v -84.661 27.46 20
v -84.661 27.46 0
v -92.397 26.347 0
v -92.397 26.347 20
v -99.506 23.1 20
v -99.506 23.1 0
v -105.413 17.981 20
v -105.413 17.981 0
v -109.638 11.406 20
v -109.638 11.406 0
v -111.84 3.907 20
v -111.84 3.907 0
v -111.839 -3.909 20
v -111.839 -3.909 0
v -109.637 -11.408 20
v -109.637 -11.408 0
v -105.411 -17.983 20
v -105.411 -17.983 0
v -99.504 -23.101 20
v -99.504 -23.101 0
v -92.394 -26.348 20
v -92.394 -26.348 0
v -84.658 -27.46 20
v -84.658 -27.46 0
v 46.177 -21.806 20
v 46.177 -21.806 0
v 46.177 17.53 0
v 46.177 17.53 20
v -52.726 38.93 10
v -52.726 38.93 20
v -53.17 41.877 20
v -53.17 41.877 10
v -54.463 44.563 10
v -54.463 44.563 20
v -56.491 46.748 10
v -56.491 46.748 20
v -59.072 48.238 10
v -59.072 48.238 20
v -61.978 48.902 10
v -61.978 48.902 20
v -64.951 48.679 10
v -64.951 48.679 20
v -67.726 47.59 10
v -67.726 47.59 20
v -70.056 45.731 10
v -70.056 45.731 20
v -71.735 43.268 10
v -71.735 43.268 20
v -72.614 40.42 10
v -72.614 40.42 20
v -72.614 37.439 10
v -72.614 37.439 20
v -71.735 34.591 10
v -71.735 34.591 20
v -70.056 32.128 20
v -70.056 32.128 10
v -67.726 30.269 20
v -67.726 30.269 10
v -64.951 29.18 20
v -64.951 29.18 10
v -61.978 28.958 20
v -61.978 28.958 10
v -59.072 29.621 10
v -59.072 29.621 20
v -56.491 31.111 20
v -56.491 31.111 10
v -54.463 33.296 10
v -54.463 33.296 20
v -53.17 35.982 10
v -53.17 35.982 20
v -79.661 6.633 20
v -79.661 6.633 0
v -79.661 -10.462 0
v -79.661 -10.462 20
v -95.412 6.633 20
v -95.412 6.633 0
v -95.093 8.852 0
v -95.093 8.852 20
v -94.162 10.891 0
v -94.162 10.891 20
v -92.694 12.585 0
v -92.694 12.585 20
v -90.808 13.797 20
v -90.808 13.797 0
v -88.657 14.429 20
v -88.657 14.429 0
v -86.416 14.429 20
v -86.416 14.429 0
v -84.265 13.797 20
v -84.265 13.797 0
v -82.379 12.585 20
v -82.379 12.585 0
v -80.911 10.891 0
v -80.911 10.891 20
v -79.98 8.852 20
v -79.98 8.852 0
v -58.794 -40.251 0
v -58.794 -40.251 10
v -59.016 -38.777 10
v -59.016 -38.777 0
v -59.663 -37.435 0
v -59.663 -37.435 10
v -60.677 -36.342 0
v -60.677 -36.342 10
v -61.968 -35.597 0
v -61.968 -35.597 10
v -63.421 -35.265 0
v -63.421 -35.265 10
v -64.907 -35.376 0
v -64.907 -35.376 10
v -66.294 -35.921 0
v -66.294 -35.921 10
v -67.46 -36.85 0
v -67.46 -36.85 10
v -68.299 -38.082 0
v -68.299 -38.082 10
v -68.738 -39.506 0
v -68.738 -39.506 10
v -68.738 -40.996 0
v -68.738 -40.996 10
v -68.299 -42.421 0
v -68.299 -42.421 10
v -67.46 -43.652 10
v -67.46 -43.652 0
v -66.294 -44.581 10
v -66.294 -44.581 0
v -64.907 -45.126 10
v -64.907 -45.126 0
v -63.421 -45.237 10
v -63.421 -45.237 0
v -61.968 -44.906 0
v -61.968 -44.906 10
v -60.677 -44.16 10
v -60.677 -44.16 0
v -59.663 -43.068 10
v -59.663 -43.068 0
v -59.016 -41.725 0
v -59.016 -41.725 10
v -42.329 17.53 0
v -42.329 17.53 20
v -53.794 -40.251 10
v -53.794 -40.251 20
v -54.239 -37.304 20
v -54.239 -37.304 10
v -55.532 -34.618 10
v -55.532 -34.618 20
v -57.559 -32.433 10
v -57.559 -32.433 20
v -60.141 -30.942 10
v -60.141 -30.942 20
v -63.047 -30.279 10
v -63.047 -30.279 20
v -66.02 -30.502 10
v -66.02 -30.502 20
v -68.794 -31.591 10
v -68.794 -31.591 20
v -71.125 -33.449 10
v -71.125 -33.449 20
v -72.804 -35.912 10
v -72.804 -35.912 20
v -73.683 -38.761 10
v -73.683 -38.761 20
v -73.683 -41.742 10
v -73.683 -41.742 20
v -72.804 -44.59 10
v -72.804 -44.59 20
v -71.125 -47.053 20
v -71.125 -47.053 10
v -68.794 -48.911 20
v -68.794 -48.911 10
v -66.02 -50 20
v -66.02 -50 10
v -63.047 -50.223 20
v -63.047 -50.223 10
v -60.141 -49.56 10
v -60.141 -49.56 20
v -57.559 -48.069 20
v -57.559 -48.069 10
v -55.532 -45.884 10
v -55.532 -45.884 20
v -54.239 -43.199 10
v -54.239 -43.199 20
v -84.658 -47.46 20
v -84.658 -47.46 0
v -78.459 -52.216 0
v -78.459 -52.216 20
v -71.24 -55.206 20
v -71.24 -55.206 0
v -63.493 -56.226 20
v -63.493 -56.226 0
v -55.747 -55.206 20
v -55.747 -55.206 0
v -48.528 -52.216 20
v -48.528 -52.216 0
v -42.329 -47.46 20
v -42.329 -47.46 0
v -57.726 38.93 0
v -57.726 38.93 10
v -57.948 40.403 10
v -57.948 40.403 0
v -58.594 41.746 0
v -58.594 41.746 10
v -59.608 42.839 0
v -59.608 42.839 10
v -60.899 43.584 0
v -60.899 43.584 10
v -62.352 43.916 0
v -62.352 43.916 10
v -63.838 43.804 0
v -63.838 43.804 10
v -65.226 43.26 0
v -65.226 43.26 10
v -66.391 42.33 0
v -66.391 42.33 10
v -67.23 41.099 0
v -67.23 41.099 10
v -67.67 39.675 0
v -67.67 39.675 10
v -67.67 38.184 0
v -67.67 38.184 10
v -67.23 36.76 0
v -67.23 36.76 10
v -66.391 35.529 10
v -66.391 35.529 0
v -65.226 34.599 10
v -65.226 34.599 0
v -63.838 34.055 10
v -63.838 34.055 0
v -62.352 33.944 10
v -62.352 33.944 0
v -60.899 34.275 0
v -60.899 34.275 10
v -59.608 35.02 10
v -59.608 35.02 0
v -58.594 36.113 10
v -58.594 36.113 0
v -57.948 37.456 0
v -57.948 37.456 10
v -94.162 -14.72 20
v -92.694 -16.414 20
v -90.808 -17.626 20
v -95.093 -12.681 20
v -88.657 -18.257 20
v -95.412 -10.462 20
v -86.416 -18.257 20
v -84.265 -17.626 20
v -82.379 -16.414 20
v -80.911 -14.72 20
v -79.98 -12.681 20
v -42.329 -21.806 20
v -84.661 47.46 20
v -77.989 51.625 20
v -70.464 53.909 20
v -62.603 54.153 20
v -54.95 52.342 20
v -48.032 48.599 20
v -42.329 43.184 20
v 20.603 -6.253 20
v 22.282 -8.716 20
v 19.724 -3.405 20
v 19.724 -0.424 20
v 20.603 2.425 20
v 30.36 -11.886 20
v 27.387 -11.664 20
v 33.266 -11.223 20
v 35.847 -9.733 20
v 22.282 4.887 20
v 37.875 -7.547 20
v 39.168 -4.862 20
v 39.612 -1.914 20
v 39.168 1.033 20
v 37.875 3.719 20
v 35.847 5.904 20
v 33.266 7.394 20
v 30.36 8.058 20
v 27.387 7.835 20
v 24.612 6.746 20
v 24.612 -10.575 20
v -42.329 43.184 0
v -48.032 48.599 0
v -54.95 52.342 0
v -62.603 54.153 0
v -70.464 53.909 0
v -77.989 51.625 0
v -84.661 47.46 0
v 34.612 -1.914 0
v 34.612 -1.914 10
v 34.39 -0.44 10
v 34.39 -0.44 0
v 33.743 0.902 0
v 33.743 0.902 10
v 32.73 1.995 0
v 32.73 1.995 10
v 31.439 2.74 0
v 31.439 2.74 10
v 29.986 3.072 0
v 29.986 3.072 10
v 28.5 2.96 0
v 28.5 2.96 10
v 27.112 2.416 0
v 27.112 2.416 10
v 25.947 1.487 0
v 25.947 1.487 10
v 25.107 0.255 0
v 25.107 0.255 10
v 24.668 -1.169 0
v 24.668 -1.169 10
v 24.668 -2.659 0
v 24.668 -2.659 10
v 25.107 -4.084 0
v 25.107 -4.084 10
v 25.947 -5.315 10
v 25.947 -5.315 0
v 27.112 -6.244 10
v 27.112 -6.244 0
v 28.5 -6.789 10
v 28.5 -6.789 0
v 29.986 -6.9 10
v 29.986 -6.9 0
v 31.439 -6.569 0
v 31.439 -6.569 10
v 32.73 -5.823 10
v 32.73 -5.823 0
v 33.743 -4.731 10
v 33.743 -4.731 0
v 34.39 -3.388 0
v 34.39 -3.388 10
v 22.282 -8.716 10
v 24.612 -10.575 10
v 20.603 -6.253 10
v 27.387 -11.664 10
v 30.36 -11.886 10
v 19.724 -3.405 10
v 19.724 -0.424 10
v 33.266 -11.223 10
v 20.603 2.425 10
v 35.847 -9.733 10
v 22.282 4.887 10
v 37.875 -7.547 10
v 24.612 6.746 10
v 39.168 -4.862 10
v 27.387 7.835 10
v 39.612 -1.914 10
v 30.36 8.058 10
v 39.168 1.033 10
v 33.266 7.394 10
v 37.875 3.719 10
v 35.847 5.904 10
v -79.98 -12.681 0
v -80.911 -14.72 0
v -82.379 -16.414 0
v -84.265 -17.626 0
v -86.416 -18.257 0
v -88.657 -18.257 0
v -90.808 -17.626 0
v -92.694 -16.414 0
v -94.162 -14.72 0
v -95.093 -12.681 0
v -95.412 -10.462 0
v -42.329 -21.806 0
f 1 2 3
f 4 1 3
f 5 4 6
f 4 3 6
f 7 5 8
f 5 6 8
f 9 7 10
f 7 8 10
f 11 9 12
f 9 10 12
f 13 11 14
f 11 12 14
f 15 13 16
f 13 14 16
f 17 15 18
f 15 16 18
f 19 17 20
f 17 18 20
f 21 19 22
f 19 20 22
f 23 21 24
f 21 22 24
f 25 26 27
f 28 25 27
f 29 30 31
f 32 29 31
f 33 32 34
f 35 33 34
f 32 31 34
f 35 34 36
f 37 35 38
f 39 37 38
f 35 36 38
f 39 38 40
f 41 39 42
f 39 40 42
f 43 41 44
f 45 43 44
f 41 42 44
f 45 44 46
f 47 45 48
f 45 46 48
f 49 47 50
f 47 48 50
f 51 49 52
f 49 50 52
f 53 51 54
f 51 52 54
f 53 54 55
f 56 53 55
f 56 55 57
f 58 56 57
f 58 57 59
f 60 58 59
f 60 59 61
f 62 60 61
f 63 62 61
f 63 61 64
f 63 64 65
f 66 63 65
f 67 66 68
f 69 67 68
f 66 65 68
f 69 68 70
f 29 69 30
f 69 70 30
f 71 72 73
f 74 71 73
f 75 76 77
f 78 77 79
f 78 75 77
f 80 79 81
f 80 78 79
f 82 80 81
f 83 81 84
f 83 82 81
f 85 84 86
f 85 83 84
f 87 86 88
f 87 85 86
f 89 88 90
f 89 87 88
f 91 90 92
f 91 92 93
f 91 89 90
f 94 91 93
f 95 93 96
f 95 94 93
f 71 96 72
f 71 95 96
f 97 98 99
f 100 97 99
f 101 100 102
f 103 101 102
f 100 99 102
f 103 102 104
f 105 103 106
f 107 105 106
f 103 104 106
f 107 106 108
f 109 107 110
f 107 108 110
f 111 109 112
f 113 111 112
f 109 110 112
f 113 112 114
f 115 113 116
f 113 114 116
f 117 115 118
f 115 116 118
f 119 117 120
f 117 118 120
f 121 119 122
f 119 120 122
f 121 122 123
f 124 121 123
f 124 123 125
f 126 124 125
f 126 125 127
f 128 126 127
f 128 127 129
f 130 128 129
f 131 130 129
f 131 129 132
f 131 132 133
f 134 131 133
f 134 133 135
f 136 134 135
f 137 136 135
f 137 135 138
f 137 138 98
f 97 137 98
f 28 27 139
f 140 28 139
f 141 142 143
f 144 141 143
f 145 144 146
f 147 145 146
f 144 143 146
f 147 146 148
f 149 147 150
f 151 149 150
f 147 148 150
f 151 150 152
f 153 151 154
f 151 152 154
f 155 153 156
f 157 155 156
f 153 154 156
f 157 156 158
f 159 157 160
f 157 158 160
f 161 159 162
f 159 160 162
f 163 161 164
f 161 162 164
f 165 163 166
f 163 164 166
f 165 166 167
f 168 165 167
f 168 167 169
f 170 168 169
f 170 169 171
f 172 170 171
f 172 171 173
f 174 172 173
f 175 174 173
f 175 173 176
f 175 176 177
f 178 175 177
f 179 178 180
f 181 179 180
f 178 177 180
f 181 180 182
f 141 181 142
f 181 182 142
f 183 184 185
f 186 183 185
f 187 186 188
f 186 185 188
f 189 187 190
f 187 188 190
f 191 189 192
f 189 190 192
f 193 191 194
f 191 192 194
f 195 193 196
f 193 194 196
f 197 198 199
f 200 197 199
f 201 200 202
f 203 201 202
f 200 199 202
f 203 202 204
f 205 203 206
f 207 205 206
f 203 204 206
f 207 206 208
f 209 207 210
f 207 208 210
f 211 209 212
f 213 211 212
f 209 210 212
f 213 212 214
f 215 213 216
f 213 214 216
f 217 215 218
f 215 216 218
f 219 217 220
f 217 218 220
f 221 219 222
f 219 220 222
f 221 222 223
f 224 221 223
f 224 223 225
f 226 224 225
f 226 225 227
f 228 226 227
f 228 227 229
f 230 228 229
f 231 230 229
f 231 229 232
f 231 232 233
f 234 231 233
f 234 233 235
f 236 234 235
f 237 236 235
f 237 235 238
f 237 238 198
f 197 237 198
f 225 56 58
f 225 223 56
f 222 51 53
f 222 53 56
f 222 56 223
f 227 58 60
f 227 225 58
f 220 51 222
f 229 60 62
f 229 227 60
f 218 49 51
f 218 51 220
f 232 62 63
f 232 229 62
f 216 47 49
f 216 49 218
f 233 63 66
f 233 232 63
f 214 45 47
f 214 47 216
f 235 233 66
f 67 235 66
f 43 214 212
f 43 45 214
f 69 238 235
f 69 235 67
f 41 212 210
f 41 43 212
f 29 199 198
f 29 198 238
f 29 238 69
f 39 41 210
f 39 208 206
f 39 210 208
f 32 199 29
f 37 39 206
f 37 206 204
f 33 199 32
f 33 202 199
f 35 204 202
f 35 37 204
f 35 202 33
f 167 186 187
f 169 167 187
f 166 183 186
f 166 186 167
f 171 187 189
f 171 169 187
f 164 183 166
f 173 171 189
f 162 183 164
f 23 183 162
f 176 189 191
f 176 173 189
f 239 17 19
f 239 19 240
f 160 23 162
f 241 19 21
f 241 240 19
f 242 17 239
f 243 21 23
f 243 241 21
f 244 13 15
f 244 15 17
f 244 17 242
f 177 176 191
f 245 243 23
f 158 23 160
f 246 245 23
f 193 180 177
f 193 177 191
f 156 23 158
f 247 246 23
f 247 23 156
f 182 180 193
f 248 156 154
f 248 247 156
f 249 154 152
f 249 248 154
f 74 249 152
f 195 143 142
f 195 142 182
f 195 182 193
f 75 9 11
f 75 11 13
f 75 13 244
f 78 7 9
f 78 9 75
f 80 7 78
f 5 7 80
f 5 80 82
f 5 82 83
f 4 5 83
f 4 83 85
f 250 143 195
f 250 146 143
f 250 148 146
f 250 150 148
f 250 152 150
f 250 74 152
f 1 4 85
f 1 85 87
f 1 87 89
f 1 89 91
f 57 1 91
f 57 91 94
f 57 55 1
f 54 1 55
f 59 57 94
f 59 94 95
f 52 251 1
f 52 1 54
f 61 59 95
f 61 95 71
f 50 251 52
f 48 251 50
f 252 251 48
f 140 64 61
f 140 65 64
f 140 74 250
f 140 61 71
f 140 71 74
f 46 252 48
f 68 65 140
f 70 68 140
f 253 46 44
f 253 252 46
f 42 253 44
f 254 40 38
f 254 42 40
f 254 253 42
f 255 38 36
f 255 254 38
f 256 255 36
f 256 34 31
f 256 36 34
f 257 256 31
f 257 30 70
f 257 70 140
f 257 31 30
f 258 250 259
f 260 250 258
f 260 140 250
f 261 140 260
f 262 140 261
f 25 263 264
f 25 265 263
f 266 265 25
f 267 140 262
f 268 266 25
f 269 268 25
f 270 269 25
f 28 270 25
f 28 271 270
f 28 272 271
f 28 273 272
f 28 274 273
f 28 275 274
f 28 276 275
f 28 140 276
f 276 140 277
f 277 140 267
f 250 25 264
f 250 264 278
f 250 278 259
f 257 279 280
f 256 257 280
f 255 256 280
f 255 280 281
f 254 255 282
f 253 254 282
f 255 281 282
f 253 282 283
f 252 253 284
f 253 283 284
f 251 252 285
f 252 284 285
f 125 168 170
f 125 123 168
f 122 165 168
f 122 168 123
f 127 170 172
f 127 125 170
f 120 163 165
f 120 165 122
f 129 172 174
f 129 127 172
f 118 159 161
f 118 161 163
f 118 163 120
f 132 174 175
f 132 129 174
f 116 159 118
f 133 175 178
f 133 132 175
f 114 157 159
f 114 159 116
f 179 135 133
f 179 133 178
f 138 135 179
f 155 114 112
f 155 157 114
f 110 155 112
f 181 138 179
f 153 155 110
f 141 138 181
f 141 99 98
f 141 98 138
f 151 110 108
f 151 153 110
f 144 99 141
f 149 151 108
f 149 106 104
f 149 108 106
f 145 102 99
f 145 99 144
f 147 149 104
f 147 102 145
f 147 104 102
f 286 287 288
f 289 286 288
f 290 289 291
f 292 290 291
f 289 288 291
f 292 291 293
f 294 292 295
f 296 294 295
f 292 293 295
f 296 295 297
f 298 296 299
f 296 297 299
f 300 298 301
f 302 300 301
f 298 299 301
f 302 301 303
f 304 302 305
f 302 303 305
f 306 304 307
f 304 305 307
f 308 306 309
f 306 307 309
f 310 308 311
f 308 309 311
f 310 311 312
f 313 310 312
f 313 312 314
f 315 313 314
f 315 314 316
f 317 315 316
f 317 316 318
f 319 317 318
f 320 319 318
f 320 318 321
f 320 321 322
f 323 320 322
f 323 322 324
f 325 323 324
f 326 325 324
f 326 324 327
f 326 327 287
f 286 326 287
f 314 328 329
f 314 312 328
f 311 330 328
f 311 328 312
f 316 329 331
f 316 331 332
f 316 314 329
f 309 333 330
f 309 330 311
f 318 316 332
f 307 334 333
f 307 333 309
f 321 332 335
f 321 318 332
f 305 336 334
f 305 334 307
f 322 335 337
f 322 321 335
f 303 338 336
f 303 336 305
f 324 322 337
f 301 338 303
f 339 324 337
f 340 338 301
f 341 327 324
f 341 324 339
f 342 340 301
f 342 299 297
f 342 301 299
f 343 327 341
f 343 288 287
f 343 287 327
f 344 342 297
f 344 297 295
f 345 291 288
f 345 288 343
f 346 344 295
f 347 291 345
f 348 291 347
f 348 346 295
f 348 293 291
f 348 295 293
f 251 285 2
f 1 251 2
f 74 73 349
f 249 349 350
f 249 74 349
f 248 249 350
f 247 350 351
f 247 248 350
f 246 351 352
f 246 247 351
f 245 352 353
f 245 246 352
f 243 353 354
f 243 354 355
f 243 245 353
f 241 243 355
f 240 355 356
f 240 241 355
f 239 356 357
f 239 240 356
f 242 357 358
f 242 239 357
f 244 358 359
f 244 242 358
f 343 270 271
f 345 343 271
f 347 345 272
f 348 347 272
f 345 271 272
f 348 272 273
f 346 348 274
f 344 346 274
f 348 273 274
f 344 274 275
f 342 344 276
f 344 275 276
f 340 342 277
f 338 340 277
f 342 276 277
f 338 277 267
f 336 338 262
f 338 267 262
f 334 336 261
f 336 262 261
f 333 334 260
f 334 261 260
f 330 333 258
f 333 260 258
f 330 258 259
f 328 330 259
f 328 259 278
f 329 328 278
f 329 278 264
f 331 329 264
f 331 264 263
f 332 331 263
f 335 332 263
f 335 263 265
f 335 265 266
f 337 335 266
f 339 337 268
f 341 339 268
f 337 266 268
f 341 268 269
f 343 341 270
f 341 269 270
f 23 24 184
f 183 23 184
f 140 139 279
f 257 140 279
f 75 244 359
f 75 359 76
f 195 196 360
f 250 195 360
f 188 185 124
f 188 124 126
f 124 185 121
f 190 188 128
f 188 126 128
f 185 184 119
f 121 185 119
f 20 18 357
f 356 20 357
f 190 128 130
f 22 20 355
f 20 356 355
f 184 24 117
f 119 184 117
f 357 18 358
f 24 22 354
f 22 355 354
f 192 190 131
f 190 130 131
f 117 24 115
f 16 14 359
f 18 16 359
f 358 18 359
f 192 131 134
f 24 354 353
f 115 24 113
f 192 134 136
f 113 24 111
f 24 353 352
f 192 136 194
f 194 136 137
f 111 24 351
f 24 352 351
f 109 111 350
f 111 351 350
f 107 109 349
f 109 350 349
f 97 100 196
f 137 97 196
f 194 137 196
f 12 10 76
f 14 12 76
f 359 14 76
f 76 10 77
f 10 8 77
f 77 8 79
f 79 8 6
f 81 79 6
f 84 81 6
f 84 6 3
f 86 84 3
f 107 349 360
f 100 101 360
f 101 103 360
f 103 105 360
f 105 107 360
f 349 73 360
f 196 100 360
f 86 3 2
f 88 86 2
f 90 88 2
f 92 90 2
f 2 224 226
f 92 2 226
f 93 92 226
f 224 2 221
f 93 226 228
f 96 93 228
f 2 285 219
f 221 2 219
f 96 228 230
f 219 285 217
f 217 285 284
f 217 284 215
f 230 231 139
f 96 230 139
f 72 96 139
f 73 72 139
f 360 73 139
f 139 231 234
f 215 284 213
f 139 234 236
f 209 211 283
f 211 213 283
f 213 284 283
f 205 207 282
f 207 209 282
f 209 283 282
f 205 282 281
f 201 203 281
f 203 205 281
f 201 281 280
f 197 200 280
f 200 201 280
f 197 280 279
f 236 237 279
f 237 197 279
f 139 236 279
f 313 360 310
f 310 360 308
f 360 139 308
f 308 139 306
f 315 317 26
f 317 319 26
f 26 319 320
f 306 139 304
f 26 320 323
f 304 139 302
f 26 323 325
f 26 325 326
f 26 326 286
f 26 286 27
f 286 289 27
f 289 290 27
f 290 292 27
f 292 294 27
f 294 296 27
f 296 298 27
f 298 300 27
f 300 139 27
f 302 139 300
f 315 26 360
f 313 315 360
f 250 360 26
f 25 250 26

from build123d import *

# Parameters (mm, degrees)
BOSS_EXTRUDE1_DEPTH = 20
SKETCH2_R           = 10
CUT_EXTRUDE1_DEPTH  = 10
CUT_EXTRUDE2_DEPTH  = 20
SKETCH4_R           = 5
CUT_EXTRUDE3_DEPTH  = 20


with BuildPart() as part:
    # Sketch1 → Boss-Extrude1 (new body)
    with BuildSketch(Plane.XY):
        with BuildLine():
            Line((46.177047915, 17.530175597), (-42.328960588, 17.530175597))
            Line((-42.328960588, 17.530175597), (-42.328960588, 43.184091105))
            ThreePointArc((-42.328960588, 43.184091105), (-62.602792244, 54.153197241), (-84.660607586, 47.459743594))
            Line((-84.660607586, 47.459743594), (-84.660607586, 27.459743594))
            ThreePointArc((-84.660607586, 27.459743594), (-112.119008023, -0.001343253), (-84.657921177, -27.45974369))
            Line((-84.657921177, -27.45974369), (-84.657921177, -47.45974369))
            ThreePointArc((-84.657921177, -47.45974369), (-63.493440882, -56.226358468), (-42.328960588, -47.45974369))
            Line((-42.328960588, -47.45974369), (-42.328960588, -21.805828182))
            Line((-42.328960588, -21.805828182), (46.177047915, -21.805828182))
            Line((46.177047915, -21.805828182), (46.177047915, 17.530175597))
        make_face()
    extrude(amount=BOSS_EXTRUDE1_DEPTH)

    # Sketch2 → Cut-Extrude1 (cut)
    with BuildSketch(Plane.XY.offset(20)):
        with Locations((29.612265592, -1.914255488)):
            Circle(SKETCH2_R)
        with Locations((-62.725631092, 38.929575976)):
            Circle(SKETCH2_R)
        with Locations((-63.794313785, -40.25113932)):
            Circle(SKETCH2_R)
    extrude(amount=-CUT_EXTRUDE1_DEPTH, mode=Mode.SUBTRACT)

    # Sketch3 → Cut-Extrude2 (cut)
    with BuildSketch(Plane.XY.offset(20)):
        with BuildLine():
            Line((-95.412007987, -10.461867625), (-95.412007987, 6.633356649))
            ThreePointArc((-95.412007987, 6.633356649), (-87.536563025, 14.508801611), (-79.661118062, 6.633356649))
            Line((-79.661118062, 6.633356649), (-79.661118062, -10.461867625))
            ThreePointArc((-79.661118062, -10.461867625), (-87.536563025, -18.337312588), (-95.412007987, -10.461867625))
        make_face()
    extrude(amount=-CUT_EXTRUDE2_DEPTH, mode=Mode.SUBTRACT)

    # Sketch4 → Cut-Extrude3 (cut)
    with BuildSketch(Plane.XY.offset(20)):
        with Locations((-62.725631092, 38.929575976)):
            Circle(SKETCH4_R)
        with Locations((-63.794313785, -40.25113932)):
            Circle(SKETCH4_R)
        with Locations((29.612265592, -1.914255488)):
            Circle(SKETCH4_R)
    extrude(amount=-CUT_EXTRUDE3_DEPTH, mode=Mode.SUBTRACT)


solid = part.part
